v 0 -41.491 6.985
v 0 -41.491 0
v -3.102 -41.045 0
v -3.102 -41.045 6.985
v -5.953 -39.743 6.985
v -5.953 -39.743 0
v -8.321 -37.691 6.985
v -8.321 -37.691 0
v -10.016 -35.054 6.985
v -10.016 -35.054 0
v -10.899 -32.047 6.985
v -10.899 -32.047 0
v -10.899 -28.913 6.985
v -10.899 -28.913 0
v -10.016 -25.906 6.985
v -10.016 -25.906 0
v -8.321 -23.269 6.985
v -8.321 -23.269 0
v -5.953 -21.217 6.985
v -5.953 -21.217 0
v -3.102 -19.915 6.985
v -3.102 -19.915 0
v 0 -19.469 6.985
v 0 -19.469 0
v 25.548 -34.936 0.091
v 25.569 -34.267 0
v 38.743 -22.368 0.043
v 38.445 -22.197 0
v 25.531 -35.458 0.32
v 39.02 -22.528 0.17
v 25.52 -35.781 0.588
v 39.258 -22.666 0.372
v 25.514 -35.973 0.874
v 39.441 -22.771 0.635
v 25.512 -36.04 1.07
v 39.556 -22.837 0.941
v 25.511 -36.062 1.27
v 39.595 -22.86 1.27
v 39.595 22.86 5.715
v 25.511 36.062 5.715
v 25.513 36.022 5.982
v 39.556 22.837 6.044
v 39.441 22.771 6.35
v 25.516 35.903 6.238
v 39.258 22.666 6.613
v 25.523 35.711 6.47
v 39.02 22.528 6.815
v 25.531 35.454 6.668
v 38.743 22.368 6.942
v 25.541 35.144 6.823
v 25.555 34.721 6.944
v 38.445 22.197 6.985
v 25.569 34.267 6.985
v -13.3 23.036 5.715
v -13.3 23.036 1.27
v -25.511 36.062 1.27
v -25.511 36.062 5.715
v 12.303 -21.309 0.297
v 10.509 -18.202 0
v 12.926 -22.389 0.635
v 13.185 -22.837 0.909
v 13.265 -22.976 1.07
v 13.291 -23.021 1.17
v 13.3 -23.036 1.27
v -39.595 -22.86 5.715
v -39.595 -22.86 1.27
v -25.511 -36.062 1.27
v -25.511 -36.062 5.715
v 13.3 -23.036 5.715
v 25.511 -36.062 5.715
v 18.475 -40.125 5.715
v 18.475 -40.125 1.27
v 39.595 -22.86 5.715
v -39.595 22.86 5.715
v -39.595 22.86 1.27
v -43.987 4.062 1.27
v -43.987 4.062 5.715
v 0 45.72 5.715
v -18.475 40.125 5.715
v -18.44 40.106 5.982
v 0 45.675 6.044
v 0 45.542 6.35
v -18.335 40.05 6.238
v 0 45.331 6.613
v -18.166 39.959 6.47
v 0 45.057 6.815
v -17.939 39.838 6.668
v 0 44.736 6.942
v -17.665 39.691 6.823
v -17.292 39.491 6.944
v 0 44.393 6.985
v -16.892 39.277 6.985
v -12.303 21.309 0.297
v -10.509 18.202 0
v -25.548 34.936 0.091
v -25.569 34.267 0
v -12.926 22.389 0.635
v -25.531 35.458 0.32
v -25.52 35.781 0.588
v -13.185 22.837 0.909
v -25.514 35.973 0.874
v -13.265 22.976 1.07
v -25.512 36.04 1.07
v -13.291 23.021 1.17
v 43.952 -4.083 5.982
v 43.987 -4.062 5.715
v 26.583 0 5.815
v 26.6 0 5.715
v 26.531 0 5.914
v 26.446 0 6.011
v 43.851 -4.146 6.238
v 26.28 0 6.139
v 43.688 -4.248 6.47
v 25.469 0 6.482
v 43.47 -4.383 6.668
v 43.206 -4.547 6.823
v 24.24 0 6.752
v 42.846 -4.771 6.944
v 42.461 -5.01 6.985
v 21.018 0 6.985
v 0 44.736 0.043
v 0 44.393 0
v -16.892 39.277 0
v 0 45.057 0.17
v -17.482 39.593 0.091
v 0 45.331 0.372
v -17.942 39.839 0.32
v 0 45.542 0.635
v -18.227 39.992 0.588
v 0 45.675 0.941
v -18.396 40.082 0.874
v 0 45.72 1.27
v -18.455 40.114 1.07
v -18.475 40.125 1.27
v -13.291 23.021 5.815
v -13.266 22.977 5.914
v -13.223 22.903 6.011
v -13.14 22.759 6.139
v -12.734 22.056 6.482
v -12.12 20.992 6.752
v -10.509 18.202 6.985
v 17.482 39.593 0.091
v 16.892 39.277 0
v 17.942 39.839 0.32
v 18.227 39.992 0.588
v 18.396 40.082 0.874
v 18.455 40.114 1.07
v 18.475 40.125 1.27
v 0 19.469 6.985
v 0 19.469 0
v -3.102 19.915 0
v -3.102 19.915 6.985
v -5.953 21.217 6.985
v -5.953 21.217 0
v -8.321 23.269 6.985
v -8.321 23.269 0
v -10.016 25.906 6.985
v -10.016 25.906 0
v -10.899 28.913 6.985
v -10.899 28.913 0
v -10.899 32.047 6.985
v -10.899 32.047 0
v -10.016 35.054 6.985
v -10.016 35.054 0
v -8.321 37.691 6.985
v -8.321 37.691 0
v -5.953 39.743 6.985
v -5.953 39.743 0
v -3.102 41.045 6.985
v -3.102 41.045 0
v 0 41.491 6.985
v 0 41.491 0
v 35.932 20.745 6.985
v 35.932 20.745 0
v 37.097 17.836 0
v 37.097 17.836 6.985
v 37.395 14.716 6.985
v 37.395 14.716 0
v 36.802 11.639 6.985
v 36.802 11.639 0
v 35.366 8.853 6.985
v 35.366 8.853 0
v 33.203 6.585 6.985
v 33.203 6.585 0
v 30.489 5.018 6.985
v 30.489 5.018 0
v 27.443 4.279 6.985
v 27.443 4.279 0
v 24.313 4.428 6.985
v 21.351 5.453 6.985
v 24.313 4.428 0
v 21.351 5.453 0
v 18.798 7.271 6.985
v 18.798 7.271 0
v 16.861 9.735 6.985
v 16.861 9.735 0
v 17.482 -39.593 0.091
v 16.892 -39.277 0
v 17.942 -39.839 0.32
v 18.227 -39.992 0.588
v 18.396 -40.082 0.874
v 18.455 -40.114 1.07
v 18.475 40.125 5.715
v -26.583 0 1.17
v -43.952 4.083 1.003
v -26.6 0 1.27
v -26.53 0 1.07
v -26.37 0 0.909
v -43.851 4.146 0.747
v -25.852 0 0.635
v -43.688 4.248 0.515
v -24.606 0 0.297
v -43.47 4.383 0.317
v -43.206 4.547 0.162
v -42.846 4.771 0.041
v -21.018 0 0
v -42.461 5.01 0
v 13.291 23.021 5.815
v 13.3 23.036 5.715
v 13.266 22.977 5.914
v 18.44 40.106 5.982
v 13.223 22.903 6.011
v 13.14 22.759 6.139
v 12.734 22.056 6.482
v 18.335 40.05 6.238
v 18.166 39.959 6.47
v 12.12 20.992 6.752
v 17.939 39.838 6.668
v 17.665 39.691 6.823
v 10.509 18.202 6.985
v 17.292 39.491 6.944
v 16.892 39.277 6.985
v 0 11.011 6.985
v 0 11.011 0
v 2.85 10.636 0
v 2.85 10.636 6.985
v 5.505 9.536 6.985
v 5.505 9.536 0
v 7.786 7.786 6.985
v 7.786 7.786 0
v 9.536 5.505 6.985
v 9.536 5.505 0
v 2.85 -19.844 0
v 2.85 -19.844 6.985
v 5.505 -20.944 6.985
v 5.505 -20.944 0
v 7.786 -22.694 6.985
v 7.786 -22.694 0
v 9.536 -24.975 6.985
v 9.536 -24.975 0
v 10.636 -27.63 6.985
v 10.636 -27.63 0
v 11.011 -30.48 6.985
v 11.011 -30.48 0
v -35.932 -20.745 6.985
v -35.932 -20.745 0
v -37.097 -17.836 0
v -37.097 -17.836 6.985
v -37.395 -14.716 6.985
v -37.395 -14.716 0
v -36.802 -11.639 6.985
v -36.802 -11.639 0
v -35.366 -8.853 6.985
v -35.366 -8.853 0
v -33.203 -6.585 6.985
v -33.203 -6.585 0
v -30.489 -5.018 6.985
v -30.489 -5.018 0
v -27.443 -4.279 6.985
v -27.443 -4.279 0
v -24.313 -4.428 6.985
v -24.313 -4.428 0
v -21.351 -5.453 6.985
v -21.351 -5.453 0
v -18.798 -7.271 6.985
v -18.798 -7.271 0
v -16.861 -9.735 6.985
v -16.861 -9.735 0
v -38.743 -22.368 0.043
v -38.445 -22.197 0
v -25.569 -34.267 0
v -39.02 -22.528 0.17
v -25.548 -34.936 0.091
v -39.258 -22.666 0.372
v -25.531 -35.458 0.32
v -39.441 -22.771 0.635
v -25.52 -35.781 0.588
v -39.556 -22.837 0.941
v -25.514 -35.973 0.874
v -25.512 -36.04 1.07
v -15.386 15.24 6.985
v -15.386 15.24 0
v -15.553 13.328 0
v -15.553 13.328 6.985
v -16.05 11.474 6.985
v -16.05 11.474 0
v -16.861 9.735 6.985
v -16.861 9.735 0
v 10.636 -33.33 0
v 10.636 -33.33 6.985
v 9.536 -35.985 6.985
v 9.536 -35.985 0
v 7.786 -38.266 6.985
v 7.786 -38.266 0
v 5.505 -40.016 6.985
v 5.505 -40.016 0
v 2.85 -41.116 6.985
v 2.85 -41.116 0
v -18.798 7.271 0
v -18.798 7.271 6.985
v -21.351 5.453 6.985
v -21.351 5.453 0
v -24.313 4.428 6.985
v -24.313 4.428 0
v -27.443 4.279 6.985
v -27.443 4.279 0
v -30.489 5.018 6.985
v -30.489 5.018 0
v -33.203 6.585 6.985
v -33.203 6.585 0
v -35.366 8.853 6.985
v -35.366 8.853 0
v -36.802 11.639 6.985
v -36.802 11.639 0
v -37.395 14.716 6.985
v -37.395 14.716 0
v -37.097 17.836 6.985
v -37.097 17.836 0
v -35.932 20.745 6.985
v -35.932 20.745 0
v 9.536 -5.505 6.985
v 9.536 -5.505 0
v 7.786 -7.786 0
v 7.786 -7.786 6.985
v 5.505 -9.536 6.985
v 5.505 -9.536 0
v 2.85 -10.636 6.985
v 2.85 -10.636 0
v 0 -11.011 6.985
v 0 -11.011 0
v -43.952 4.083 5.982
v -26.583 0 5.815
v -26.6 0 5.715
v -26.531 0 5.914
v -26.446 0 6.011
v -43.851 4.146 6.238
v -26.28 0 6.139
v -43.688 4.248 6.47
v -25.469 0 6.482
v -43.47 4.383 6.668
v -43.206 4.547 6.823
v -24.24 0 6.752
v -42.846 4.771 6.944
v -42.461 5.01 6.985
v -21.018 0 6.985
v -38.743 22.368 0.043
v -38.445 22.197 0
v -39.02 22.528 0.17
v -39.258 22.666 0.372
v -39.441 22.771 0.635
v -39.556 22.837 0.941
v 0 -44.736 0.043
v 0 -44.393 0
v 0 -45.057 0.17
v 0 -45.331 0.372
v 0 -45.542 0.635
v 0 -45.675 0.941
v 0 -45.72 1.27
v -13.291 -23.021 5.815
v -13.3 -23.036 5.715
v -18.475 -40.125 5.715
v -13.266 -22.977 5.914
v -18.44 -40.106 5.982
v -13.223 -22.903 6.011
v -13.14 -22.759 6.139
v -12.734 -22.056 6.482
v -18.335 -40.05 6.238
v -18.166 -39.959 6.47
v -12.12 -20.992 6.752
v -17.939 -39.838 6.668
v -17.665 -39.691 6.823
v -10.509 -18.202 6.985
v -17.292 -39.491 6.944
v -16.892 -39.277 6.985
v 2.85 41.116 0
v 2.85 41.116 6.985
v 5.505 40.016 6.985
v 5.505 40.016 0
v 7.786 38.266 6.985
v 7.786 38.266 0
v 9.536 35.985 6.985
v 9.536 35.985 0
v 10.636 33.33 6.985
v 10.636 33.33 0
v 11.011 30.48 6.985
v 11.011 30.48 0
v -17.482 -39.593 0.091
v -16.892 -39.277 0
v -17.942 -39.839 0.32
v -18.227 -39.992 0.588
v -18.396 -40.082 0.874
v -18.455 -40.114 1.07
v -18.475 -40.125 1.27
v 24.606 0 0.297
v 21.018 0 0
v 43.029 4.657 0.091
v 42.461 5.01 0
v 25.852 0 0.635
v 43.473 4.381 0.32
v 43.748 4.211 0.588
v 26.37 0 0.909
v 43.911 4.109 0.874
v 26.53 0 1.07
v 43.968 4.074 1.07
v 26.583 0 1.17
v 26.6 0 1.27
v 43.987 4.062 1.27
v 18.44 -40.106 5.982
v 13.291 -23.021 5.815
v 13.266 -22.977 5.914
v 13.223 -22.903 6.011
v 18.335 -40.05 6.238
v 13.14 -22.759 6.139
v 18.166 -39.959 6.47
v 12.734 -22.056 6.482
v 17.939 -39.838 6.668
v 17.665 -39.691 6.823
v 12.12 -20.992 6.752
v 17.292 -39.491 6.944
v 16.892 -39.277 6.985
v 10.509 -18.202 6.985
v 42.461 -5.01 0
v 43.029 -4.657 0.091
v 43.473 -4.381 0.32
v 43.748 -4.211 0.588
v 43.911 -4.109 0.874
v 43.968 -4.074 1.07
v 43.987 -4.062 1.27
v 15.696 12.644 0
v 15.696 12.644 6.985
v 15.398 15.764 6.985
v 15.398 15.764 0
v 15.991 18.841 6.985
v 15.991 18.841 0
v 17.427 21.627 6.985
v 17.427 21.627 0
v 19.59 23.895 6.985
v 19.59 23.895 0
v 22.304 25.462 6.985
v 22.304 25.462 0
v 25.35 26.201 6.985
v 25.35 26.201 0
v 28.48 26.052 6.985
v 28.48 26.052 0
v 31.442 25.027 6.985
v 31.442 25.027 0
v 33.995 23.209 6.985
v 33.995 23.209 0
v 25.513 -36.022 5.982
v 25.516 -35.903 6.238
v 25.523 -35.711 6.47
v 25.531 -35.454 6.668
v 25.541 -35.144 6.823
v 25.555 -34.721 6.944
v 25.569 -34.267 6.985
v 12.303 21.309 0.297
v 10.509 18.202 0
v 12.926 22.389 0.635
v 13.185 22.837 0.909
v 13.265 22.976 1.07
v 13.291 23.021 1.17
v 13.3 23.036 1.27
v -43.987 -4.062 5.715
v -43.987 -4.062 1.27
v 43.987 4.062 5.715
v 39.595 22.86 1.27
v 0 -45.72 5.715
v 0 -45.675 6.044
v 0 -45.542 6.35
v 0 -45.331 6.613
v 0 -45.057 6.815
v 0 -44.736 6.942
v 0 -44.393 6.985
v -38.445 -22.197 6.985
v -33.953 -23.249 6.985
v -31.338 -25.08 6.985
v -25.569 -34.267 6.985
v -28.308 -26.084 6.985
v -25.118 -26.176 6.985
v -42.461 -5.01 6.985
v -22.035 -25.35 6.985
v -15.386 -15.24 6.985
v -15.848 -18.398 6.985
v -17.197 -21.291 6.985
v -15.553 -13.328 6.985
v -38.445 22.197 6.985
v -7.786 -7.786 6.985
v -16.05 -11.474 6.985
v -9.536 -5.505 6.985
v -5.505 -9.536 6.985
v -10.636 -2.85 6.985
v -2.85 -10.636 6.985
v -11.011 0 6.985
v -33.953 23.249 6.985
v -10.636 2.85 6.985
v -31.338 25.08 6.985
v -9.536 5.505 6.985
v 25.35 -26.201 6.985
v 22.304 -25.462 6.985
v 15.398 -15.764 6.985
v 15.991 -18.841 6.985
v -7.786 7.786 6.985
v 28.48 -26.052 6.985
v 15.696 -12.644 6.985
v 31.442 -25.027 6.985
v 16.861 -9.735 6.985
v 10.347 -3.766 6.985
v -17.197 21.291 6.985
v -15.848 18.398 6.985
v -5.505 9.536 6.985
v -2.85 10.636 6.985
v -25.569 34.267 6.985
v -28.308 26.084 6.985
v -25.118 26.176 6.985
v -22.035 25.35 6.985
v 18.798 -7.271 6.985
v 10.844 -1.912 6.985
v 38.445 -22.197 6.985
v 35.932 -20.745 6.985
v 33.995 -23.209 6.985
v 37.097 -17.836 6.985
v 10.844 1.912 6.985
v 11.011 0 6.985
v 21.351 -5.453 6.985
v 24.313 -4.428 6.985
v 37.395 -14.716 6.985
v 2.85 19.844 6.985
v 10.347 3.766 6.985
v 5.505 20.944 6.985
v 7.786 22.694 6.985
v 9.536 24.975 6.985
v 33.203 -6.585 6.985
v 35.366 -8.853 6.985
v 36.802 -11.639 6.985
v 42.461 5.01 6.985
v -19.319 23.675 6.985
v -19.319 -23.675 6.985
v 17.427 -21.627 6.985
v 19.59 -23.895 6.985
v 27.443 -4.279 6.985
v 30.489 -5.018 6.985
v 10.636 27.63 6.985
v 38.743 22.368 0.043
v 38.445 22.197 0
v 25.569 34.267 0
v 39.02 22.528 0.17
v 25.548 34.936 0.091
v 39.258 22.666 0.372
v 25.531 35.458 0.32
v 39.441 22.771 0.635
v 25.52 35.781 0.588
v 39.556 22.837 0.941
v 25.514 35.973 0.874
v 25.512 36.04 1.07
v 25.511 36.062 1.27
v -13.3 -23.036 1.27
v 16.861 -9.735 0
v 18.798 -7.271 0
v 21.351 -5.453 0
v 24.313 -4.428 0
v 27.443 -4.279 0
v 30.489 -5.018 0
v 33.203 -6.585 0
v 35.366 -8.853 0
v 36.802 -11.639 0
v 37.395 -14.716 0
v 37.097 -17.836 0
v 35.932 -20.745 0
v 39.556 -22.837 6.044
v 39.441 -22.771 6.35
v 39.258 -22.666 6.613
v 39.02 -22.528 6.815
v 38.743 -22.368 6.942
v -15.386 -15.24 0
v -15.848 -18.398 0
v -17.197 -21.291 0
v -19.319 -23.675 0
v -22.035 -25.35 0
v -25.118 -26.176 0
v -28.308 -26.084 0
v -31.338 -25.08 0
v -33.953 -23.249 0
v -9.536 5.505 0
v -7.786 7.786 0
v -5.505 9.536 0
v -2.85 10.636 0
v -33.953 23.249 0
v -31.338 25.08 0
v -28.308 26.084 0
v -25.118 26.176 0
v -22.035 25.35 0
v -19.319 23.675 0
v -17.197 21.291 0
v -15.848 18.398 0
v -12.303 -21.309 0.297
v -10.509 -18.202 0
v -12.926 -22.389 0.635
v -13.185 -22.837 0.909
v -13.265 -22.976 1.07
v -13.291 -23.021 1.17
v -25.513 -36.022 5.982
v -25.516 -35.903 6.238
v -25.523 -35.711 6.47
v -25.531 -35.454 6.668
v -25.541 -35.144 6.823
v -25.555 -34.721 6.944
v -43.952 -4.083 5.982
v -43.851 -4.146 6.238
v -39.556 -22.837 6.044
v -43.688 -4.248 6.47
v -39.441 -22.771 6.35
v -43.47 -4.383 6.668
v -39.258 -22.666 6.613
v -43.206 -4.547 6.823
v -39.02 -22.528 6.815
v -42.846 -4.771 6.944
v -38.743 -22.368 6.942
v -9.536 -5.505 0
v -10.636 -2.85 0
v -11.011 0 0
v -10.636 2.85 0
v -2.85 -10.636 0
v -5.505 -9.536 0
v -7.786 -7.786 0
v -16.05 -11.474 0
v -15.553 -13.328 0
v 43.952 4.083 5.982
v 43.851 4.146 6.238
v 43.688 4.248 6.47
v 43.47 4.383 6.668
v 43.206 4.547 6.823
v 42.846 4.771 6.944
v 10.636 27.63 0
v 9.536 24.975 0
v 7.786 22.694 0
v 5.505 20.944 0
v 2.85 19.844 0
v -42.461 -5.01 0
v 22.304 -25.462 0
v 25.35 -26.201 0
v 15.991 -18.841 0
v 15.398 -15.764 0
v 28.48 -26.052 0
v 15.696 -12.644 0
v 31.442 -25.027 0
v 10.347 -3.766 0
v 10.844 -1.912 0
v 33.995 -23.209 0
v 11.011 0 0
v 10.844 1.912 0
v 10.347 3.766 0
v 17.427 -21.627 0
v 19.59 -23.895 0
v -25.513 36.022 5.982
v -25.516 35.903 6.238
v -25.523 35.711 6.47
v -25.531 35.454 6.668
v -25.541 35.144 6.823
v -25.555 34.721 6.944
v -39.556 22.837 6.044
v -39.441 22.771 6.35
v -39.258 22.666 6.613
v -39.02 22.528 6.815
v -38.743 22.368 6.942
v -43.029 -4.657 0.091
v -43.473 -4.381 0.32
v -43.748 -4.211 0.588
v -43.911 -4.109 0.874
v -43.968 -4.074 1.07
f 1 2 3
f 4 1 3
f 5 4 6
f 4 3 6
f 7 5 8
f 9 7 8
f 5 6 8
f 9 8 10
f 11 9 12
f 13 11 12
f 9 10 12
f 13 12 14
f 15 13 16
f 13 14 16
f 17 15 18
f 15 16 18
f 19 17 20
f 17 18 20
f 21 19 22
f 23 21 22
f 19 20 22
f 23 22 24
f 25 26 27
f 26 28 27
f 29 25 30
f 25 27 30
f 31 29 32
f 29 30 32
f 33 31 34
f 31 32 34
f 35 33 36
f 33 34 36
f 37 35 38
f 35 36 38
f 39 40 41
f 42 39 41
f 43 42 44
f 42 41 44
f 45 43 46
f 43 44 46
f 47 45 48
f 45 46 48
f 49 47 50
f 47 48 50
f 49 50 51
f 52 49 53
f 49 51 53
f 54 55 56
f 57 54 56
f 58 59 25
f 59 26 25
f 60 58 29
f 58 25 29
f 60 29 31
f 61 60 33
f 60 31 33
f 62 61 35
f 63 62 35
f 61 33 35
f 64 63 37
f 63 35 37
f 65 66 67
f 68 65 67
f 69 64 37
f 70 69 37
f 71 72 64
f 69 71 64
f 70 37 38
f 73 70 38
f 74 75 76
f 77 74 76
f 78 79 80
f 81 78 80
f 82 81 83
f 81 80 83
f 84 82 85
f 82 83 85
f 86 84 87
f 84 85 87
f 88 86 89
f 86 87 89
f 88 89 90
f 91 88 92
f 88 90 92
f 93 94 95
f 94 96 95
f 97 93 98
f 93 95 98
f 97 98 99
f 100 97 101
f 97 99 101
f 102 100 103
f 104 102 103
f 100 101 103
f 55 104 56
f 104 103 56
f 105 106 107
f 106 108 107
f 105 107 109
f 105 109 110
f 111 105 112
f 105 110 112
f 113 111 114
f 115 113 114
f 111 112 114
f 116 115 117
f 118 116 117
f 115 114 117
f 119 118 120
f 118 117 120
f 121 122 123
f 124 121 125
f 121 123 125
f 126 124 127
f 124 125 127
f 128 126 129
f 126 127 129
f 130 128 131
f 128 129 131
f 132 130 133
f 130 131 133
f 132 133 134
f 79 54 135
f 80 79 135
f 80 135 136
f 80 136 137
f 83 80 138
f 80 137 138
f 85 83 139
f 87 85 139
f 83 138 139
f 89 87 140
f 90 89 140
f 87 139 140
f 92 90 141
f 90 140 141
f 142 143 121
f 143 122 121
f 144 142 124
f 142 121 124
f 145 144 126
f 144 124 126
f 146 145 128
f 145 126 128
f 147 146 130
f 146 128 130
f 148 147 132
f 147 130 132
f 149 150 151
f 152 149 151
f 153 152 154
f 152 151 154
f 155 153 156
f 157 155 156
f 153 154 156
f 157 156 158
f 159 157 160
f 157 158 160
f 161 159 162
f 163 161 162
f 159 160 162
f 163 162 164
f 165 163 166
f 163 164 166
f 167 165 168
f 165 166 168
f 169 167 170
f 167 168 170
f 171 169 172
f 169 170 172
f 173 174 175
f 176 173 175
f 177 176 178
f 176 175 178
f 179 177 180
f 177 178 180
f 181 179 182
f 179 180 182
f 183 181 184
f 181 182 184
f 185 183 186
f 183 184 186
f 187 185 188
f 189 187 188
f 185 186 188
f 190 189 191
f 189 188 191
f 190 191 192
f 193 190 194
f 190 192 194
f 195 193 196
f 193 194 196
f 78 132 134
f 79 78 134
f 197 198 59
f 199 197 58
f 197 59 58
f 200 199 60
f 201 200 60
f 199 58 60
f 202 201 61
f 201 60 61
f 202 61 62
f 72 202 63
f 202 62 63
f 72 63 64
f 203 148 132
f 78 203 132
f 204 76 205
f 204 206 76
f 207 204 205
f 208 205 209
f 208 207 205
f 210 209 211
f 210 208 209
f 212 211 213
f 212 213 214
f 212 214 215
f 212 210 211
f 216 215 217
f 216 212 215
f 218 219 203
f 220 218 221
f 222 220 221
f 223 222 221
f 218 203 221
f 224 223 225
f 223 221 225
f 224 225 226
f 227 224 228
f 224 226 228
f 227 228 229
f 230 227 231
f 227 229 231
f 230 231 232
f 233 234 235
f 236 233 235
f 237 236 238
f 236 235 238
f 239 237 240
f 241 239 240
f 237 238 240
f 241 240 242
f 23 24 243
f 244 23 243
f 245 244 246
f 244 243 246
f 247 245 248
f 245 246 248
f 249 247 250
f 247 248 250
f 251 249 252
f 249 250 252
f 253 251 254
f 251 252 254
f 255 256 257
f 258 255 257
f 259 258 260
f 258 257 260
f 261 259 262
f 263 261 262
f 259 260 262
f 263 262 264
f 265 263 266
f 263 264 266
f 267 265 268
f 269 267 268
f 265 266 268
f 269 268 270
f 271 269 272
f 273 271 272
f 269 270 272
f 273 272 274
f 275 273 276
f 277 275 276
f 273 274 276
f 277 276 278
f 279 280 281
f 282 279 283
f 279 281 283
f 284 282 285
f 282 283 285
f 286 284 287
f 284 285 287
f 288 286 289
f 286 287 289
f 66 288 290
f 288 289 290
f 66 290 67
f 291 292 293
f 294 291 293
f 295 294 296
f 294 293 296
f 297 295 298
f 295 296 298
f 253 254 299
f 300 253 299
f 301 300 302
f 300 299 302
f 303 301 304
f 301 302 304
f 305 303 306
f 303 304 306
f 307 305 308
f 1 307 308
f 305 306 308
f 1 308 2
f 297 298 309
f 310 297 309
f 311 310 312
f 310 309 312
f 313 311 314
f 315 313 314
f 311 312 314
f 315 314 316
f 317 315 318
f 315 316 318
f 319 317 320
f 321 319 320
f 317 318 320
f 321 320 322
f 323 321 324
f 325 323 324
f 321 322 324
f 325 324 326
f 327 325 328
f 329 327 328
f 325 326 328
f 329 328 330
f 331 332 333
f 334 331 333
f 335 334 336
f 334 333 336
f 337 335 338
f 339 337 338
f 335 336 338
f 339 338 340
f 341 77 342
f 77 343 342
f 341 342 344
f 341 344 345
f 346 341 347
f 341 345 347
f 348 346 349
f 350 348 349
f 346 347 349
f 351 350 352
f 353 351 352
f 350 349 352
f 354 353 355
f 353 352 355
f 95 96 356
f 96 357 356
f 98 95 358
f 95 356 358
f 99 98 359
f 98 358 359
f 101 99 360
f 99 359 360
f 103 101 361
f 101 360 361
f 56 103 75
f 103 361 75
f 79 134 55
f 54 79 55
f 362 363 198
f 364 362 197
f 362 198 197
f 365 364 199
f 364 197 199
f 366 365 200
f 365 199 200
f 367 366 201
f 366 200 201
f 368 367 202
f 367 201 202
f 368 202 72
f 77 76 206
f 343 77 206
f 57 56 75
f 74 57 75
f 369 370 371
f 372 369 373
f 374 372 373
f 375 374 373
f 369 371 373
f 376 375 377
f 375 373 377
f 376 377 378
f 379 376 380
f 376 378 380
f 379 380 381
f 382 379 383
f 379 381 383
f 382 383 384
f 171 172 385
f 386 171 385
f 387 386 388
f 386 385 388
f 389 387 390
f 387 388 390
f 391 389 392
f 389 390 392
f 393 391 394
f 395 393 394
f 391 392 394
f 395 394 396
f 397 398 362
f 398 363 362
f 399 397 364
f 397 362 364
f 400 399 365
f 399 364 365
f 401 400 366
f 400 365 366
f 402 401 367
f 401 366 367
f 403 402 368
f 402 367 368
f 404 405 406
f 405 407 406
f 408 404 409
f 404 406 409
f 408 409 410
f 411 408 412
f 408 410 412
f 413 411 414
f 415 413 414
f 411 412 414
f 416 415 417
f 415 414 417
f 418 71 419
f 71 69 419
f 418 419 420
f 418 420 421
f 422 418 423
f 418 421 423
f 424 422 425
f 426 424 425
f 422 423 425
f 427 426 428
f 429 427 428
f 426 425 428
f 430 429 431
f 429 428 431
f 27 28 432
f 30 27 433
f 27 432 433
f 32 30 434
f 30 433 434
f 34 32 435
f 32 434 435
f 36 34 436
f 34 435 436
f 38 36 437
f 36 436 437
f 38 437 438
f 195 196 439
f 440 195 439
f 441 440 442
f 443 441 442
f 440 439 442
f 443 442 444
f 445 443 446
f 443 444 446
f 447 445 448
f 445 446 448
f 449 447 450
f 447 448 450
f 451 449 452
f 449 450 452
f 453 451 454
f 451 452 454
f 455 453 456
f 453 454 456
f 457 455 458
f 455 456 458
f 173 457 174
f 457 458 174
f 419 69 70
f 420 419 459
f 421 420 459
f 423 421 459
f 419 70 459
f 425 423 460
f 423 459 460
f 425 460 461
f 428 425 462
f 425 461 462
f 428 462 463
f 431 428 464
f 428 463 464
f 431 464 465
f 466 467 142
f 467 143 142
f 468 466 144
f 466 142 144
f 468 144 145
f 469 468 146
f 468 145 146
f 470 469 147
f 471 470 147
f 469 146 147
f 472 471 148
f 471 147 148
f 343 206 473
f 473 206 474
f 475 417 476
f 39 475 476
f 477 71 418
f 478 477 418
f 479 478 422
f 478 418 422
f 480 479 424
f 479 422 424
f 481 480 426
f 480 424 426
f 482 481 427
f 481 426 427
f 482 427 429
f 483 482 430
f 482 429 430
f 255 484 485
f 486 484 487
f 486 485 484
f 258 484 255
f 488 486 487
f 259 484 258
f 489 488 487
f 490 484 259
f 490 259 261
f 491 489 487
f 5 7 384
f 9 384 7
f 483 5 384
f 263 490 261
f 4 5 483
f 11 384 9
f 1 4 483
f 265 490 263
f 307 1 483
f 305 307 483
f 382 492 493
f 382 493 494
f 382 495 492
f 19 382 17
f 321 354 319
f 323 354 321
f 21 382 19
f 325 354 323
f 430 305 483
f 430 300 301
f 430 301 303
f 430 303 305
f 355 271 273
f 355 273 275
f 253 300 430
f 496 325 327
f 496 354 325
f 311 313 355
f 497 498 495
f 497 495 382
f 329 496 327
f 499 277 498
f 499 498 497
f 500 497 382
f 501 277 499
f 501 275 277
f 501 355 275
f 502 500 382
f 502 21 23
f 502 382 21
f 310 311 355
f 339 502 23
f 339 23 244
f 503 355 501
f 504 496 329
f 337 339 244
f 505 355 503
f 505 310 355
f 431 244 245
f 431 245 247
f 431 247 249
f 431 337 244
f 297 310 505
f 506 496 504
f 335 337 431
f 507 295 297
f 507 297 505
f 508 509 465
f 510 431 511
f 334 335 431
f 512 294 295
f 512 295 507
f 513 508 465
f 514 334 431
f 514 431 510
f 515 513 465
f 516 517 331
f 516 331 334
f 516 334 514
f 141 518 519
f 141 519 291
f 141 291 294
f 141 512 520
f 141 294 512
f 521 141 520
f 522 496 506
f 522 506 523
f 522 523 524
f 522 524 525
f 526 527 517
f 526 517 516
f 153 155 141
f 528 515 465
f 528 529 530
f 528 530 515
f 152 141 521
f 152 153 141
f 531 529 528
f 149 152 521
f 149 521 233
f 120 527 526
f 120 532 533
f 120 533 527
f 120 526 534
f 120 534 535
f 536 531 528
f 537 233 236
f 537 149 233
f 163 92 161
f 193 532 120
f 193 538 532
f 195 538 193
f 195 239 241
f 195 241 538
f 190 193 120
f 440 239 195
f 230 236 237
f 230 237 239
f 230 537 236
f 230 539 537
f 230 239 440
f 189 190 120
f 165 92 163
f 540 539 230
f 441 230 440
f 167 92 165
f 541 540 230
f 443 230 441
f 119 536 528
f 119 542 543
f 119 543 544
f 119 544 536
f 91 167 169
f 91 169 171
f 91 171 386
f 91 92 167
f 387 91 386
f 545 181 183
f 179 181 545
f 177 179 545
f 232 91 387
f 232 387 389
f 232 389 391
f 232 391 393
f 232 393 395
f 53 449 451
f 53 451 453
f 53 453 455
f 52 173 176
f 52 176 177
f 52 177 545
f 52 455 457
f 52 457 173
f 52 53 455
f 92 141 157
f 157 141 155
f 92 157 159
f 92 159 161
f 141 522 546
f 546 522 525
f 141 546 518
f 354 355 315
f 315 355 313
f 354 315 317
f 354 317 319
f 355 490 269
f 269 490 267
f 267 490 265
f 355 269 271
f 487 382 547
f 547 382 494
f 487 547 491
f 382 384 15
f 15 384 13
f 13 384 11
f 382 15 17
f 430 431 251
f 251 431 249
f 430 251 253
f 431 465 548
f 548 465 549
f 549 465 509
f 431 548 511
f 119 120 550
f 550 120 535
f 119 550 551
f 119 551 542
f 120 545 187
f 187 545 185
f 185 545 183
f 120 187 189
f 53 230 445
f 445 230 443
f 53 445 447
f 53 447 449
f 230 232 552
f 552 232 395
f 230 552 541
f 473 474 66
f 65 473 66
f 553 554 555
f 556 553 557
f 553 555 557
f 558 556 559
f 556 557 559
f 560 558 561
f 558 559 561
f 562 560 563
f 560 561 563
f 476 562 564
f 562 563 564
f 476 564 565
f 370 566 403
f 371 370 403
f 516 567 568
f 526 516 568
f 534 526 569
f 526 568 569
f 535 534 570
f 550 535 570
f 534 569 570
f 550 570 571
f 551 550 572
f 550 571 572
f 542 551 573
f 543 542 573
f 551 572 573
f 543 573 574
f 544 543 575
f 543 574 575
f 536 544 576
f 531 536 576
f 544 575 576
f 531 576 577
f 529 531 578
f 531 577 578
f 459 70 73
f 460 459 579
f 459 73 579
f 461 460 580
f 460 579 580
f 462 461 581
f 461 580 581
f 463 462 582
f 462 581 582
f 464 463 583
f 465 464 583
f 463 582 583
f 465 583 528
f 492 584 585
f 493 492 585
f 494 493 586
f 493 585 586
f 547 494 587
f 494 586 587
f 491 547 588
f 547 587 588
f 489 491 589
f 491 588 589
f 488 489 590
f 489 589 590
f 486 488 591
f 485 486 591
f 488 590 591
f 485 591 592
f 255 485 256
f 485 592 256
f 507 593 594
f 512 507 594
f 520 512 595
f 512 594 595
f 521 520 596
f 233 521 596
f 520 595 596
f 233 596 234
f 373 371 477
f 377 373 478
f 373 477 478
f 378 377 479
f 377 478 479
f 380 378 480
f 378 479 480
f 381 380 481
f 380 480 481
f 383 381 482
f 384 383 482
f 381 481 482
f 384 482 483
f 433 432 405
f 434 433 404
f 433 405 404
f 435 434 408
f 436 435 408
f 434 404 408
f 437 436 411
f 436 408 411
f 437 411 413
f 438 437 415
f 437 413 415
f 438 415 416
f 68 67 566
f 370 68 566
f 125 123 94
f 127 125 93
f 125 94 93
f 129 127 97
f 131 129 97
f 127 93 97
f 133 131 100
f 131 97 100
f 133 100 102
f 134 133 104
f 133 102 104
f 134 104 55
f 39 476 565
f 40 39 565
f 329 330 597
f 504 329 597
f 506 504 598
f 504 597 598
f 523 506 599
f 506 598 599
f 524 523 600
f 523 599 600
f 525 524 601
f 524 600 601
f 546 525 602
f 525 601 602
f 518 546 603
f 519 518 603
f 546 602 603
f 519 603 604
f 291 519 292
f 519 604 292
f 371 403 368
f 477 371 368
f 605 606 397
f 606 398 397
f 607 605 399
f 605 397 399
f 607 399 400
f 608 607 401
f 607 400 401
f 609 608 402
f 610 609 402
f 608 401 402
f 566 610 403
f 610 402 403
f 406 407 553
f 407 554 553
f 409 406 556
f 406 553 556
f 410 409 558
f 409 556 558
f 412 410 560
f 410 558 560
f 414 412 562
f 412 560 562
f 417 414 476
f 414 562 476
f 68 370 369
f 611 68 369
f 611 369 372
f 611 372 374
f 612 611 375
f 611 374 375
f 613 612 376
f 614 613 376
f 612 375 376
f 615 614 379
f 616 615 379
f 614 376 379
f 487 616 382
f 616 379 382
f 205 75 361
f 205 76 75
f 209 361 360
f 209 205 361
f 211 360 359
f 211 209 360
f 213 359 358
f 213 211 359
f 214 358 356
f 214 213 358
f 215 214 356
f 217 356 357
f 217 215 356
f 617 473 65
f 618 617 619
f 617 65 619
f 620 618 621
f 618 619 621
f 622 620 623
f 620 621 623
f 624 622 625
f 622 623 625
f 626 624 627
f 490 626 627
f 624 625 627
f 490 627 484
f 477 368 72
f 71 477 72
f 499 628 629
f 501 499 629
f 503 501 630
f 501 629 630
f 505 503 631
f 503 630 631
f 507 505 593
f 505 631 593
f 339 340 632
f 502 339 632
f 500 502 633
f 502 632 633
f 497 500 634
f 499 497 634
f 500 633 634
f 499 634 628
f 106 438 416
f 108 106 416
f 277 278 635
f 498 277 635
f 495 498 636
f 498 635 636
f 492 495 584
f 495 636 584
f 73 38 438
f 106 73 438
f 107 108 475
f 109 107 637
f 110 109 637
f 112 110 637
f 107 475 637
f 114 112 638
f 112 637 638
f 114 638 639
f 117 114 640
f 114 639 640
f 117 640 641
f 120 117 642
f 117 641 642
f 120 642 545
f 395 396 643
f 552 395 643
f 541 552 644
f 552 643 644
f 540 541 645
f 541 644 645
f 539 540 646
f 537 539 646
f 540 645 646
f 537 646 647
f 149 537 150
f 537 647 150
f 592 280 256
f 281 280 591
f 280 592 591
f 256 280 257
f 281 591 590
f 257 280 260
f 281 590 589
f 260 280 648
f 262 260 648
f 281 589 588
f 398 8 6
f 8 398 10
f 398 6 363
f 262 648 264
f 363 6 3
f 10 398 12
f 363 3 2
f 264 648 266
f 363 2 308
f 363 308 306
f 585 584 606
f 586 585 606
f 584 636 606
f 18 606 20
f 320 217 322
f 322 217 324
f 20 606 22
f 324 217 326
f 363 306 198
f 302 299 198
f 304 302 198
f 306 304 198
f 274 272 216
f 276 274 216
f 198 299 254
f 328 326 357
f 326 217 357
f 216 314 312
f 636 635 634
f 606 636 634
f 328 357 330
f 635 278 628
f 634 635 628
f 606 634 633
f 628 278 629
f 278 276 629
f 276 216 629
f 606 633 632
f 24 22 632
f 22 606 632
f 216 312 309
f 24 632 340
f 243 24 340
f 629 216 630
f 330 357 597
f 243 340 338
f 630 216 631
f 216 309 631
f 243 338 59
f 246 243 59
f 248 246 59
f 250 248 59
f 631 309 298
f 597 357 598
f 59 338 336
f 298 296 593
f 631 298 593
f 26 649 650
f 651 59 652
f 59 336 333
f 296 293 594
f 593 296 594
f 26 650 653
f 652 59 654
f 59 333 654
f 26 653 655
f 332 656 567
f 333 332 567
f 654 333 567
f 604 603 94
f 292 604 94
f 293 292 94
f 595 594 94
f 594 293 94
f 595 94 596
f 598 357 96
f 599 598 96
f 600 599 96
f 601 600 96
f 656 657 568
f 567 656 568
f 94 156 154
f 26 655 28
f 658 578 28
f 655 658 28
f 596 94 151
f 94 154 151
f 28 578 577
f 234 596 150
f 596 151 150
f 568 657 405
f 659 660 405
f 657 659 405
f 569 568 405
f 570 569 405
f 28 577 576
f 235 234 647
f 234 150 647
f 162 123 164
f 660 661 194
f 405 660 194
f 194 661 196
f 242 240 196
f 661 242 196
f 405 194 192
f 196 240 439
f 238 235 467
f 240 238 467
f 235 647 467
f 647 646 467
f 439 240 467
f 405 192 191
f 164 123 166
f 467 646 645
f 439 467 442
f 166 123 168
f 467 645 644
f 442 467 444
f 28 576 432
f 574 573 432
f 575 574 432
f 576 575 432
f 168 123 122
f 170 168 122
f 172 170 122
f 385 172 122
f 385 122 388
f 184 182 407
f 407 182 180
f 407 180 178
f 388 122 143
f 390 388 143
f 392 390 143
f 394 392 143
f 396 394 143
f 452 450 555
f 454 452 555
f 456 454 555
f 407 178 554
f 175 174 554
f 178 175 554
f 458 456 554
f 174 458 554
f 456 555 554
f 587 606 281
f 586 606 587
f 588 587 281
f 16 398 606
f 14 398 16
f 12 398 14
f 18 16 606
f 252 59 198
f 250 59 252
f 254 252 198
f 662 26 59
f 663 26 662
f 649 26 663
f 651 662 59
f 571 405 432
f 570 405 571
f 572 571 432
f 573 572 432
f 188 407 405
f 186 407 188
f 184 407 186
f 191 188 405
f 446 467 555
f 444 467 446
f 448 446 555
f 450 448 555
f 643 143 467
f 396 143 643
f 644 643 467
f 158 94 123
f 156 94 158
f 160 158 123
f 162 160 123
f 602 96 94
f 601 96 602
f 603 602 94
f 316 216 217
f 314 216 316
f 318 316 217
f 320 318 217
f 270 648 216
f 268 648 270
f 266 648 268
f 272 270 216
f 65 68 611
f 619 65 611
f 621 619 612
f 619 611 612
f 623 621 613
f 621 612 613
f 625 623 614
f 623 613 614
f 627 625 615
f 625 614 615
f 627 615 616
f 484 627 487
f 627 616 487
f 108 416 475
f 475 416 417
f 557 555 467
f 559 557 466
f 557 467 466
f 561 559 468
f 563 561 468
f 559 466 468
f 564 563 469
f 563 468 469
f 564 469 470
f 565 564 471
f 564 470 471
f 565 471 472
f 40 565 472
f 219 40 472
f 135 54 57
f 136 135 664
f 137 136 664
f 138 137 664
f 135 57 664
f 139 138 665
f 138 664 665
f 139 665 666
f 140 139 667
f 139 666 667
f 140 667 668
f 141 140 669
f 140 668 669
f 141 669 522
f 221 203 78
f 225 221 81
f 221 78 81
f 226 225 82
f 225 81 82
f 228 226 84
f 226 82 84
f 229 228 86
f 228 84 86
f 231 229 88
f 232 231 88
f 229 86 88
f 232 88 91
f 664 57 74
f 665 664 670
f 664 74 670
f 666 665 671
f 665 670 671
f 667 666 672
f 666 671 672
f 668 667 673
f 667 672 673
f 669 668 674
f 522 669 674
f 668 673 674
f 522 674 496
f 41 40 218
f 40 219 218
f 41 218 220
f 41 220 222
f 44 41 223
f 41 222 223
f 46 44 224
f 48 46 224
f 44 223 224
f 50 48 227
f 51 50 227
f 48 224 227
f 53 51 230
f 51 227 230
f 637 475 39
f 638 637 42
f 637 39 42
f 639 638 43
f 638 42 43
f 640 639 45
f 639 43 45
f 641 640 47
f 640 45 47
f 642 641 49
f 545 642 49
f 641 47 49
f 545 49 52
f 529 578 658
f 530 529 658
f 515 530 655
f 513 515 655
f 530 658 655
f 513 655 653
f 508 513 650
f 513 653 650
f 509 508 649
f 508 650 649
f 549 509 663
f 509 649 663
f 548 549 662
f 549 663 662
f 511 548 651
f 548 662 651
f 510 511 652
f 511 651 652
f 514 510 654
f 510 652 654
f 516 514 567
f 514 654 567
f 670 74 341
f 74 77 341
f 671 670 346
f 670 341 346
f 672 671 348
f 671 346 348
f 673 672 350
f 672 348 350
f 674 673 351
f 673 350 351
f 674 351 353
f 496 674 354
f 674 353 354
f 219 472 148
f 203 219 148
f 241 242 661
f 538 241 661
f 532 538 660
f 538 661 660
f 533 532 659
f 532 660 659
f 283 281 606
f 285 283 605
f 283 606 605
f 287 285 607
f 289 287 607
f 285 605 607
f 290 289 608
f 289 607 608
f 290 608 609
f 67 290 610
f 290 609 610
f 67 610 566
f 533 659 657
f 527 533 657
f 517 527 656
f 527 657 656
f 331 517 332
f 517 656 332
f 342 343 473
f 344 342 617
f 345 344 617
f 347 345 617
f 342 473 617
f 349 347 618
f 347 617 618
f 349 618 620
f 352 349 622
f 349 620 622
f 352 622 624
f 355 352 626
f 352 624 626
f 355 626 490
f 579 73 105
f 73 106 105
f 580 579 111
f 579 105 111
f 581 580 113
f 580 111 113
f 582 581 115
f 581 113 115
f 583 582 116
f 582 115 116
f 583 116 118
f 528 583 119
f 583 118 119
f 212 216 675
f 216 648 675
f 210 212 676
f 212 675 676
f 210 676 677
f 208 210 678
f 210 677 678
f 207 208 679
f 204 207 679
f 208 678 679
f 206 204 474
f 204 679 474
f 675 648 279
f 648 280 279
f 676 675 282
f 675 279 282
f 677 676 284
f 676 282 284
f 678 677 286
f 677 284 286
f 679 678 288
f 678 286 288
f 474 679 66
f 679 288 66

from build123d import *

# Parameters (mm, degrees)
F1_DEPTH = 6.985
F2_R     = 1.27
F3_R     = 1.27


with BuildPart() as f1:
    # F0 (on Top) → F1 (new body)
    with BuildSketch(Plane.XY):
        with BuildLine():
            Line((16.8607351888, 9.73455), (12.3232464425, 7.1148296509))
            ThreePointArc((12.3232464425, 7.1148296509), (13.2836873211, 5.1016521834), (13.9177271481, 2.9631191126))
            Line((13.9177271481, 2.9631191126), (26.6000035513, 0))
            Line((26.6000035513, 0), (43.9866338233, 4.0622562405))
            Line((43.9866338233, 4.0622562405), (39.594681461, 22.86))
            Line((39.594681461, 22.86), (35.9321734259, 20.74545))
            ThreePointArc((35.9321734259, 20.74545), (37.032166988, 18.0898306237), (37.4073543073, 15.24))
            ThreePointArc((37.4073543073, 15.24), (29.2462849311, 4.6042873193), (16.8607351888, 9.73455))
        make_face()
        with BuildLine():
            ThreePointArc((9.525, 10.5715457169), (11.0600040526, 8.9531845843), (12.3232464425, 7.1148296509))
            Line((12.3232464425, 7.1148296509), (16.8607351888, 9.73455))
            ThreePointArc((16.8607351888, 9.73455), (20.8910043073, 24.7757191185), (35.9321734259, 20.74545))
            Line((35.9321734259, 20.74545), (39.594681461, 22.86))
            Line((39.594681461, 22.86), (25.5113340126, 36.0624141977))
            Line((25.5113340126, 36.0624141977), (13.3000017757, 23.0362788162))
            Line((13.3000017757, 23.0362788162), (9.525, 10.5715457169))
        make_face()
        with BuildLine():
            Line((16.8607351888, -9.73455), (12.3232464425, -7.1148296509))
            ThreePointArc((12.3232464425, -7.1148296509), (11.0600040526, -8.9531845843), (9.525, -10.5715457169))
            Line((9.525, -10.5715457169), (13.3000017757, -23.0362788162))
            Line((13.3000017757, -23.0362788162), (25.5113340126, -36.0624141977))
            Line((25.5113340126, -36.0624141977), (39.594681461, -22.86))
            Line((39.594681461, -22.86), (35.9321734259, -20.74545))
            ThreePointArc((35.9321734259, -20.74545), (20.8910043073, -24.7757191185), (16.8607351888, -9.73455))
        make_face()
        with BuildLine():
            ThreePointArc((13.9177271481, -2.9631191126), (13.2836873211, -5.1016521834), (12.3232464425, -7.1148296509))
            Line((12.3232464425, -7.1148296509), (16.8607351888, -9.73455))
            ThreePointArc((16.8607351888, -9.73455), (29.2462849311, -4.6042873193), (37.4073543073, -15.24))
            ThreePointArc((37.4073543073, -15.24), (37.032166988, -18.0898306237), (35.9321734259, -20.74545))
            Line((35.9321734259, -20.74545), (39.594681461, -22.86))
            Line((39.594681461, -22.86), (43.9866338233, -4.0622562405))
            Line((43.9866338233, -4.0622562405), (26.6000035513, 0))
            Line((26.6000035513, 0), (13.9177271481, -2.9631191126))
        make_face()
        with BuildLine():
            ThreePointArc((-4.3927271481, 13.5346648295), (-2.2236832685, 14.0548367676), (0, 14.2296593017))
            Line((0, 14.2296593017), (0, 19.4691))
            ThreePointArc((0, 19.4691), (-11.0109, 30.48), (0, 41.4909))
            Line((0, 41.4909), (0, 45.72))
            Line((0, 45.72), (-18.4752998107, 40.1246704382))
            Line((-18.4752998107, 40.1246704382), (-13.3000017757, 23.0362788162))
            Line((-13.3000017757, 23.0362788162), (-4.3927271481, 13.5346648295))
        make_face()
        with BuildLine():
            Line((0, 19.4691), (0, 14.2296593017))
            ThreePointArc((0, 14.2296593017), (2.2236832685, 14.0548367676), (4.3927271481, 13.5346648295))
            Line((4.3927271481, 13.5346648295), (13.3000017757, 23.0362788162))
            Line((13.3000017757, 23.0362788162), (18.4752998107, 40.1246704382))
            Line((18.4752998107, 40.1246704382), (0, 45.72))
            Line((0, 45.72), (0, 41.4909))
            ThreePointArc((0, 41.4909), (7.785882057, 38.265882057), (11.0109, 30.48))
            ThreePointArc((11.0109, 30.48), (7.785882057, 22.694117943), (0, 19.4691))
        make_face()
        with BuildLine():
            Line((26.6000035513, 0), (13.9177271481, 2.9631191126))
            ThreePointArc((13.9177271481, 2.9631191126), (14.1514613983, 1.4897463328), (14.2296593017, 0))
            ThreePointArc((14.2296593017, 0), (14.1514613983, -1.4897463328), (13.9177271481, -2.9631191126))
            Line((13.9177271481, -2.9631191126), (26.6000035513, 0))
        make_face()
        with BuildLine():
            ThreePointArc((4.3927271481, 13.5346648295), (7.1148296509, 12.3232464425), (9.525, 10.5715457169))
            Line((9.525, 10.5715457169), (13.3000017757, 23.0362788162))
            Line((13.3000017757, 23.0362788162), (4.3927271481, 13.5346648295))
        make_face()
        with BuildLine():
            Line((0, -19.4691), (0, -14.2296593017))
            ThreePointArc((0, -14.2296593017), (-2.2236832685, -14.0548367676), (-4.3927271481, -13.5346648295))
            Line((-4.3927271481, -13.5346648295), (-13.3000017757, -23.0362788162))
            Line((-13.3000017757, -23.0362788162), (-18.4752998107, -40.1246704382))
            Line((-18.4752998107, -40.1246704382), (0, -45.72))
            Line((0, -45.72), (0, -41.4909))
            ThreePointArc((0, -41.4909), (-11.0109, -30.48), (0, -19.4691))
        make_face()
        with BuildLine():
            ThreePointArc((4.3927271481, -13.5346648295), (2.2236832685, -14.0548367676), (0, -14.2296593017))
            Line((0, -14.2296593017), (0, -19.4691))
            ThreePointArc((0, -19.4691), (7.785882057, -22.694117943), (11.0109, -30.48))
            ThreePointArc((11.0109, -30.48), (7.785882057, -38.265882057), (0, -41.4909))
            Line((0, -41.4909), (0, -45.72))
            Line((0, -45.72), (18.4752998107, -40.1246704382))
            Line((18.4752998107, -40.1246704382), (13.3000017757, -23.0362788162))
            Line((13.3000017757, -23.0362788162), (4.3927271481, -13.5346648295))
        make_face()
        with BuildLine():
            Line((13.3000017757, -23.0362788162), (9.525, -10.5715457169))
            ThreePointArc((9.525, -10.5715457169), (7.1148296509, -12.3232464425), (4.3927271481, -13.5346648295))
            Line((4.3927271481, -13.5346648295), (13.3000017757, -23.0362788162))
        make_face()
        with BuildLine():
            Line((-16.8607351888, 9.73455), (-12.3232464425, 7.1148296509))
            ThreePointArc((-12.3232464425, 7.1148296509), (-11.0600040526, 8.9531845843), (-9.525, 10.5715457169))
            Line((-9.525, 10.5715457169), (-13.3000017757, 23.0362788162))
            Line((-13.3000017757, 23.0362788162), (-25.5113340126, 36.0624141977))
            Line((-25.5113340126, 36.0624141977), (-39.594681461, 22.86))
            Line((-39.594681461, 22.86), (-35.9321734259, 20.74545))
            ThreePointArc((-35.9321734259, 20.74545), (-23.5466236836, 25.8757126807), (-15.3855543073, 15.24))
            ThreePointArc((-15.3855543073, 15.24), (-15.7607416267, 12.3901693763), (-16.8607351888, 9.73455))
        make_face()
        with BuildLine():
            ThreePointArc((-13.9177271481, 2.9631191126), (-13.2836873211, 5.1016521834), (-12.3232464425, 7.1148296509))
            Line((-12.3232464425, 7.1148296509), (-16.8607351888, 9.73455))
            ThreePointArc((-16.8607351888, 9.73455), (-31.9019043073, 5.7042808815), (-35.9321734259, 20.74545))
            Line((-35.9321734259, 20.74545), (-39.594681461, 22.86))
            Line((-39.594681461, 22.86), (-43.9866338233, 4.0622562405))
            Line((-43.9866338233, 4.0622562405), (-26.6000035513, 0))
            Line((-26.6000035513, 0), (-13.9177271481, 2.9631191126))
        make_face()
        with BuildLine():
            ThreePointArc((-9.525, 10.5715457169), (-7.1148296509, 12.3232464425), (-4.3927271481, 13.5346648295))
            Line((-4.3927271481, 13.5346648295), (-13.3000017757, 23.0362788162))
            Line((-13.3000017757, 23.0362788162), (-9.525, 10.5715457169))
        make_face()
        with BuildLine():
            Line((-16.8607351888, -9.73455), (-12.3232464425, -7.1148296509))
            ThreePointArc((-12.3232464425, -7.1148296509), (-13.2836873211, -5.1016521834), (-13.9177271481, -2.9631191126))
            Line((-13.9177271481, -2.9631191126), (-26.6000035513, 0))
            Line((-26.6000035513, 0), (-43.9866338233, -4.0622562405))
            Line((-43.9866338233, -4.0622562405), (-39.594681461, -22.86))
            Line((-39.594681461, -22.86), (-35.9321734259, -20.74545))
            ThreePointArc((-35.9321734259, -20.74545), (-31.9019043073, -5.7042808815), (-16.8607351888, -9.73455))
        make_face()
        with BuildLine():
            ThreePointArc((-9.525, -10.5715457169), (-11.0600040526, -8.9531845843), (-12.3232464425, -7.1148296509))
            Line((-12.3232464425, -7.1148296509), (-16.8607351888, -9.73455))
            ThreePointArc((-16.8607351888, -9.73455), (-15.7607416267, -12.3901693763), (-15.3855543073, -15.24))
            ThreePointArc((-15.3855543073, -15.24), (-23.5466236836, -25.8757126807), (-35.9321734259, -20.74545))
            Line((-35.9321734259, -20.74545), (-39.594681461, -22.86))
            Line((-39.594681461, -22.86), (-25.5113340126, -36.0624141977))
            Line((-25.5113340126, -36.0624141977), (-13.3000017757, -23.0362788162))
            Line((-13.3000017757, -23.0362788162), (-9.525, -10.5715457169))
        make_face()
        with BuildLine():
            Line((-13.3000017757, -23.0362788162), (-4.3927271481, -13.5346648295))
            ThreePointArc((-4.3927271481, -13.5346648295), (-7.1148296509, -12.3232464425), (-9.525, -10.5715457169))
            Line((-9.525, -10.5715457169), (-13.3000017757, -23.0362788162))
        make_face()
        with BuildLine():
            ThreePointArc((-13.9177271481, -2.9631191126), (-14.2296593017, 0), (-13.9177271481, 2.9631191126))
            Line((-13.9177271481, 2.9631191126), (-26.6000035513, 0))
            Line((-26.6000035513, 0), (-13.9177271481, -2.9631191126))
        make_face()
        with BuildLine():
            ThreePointArc((-9.5357191185, -5.50545), (-11.0109, 0), (-9.5357191185, 5.50545))
            Line((-9.5357191185, 5.50545), (-12.3232464425, 7.1148296509))
            ThreePointArc((-12.3232464425, 7.1148296509), (-13.2836873211, 5.1016521834), (-13.9177271481, 2.9631191126))
            ThreePointArc((-13.9177271481, 2.9631191126), (-14.2296593017, 0), (-13.9177271481, -2.9631191126))
            ThreePointArc((-13.9177271481, -2.9631191126), (-13.2836873211, -5.1016521834), (-12.3232464425, -7.1148296509))
            Line((-12.3232464425, -7.1148296509), (-9.5357191185, -5.50545))
        make_face()
        with BuildLine():
            ThreePointArc((-9.5357191185, 5.50545), (-5.50545, 9.5357191185), (0, 11.0109))
            Line((0, 11.0109), (0, 14.2296593017))
            ThreePointArc((0, 14.2296593017), (-2.2236832685, 14.0548367676), (-4.3927271481, 13.5346648295))
            ThreePointArc((-4.3927271481, 13.5346648295), (-7.1148296509, 12.3232464425), (-9.525, 10.5715457169))
            ThreePointArc((-9.525, 10.5715457169), (-11.0600040526, 8.9531845843), (-12.3232464425, 7.1148296509))
            Line((-12.3232464425, 7.1148296509), (-9.5357191185, 5.50545))
        make_face()
        with BuildLine():
            ThreePointArc((0, 11.0109), (5.50545, 9.5357191185), (9.5357191185, 5.50545))
            Line((9.5357191185, 5.50545), (12.3232464425, 7.1148296509))
            ThreePointArc((12.3232464425, 7.1148296509), (11.0600040526, 8.9531845843), (9.525, 10.5715457169))
            ThreePointArc((9.525, 10.5715457169), (7.1148296509, 12.3232464425), (4.3927271481, 13.5346648295))
            ThreePointArc((4.3927271481, 13.5346648295), (2.2236832685, 14.0548367676), (0, 14.2296593017))
            Line((0, 14.2296593017), (0, 11.0109))
        make_face()
        with BuildLine():
            ThreePointArc((9.5357191185, 5.50545), (10.6357126807, 2.8498306237), (11.0109, 0))
            ThreePointArc((11.0109, 0), (10.6357126807, -2.8498306237), (9.5357191185, -5.50545))
            Line((9.5357191185, -5.50545), (12.3232464425, -7.1148296509))
            ThreePointArc((12.3232464425, -7.1148296509), (13.2836873211, -5.1016521834), (13.9177271481, -2.9631191126))
            ThreePointArc((13.9177271481, -2.9631191126), (14.1514613983, -1.4897463328), (14.2296593017, 0))
            ThreePointArc((14.2296593017, 0), (14.1514613983, 1.4897463328), (13.9177271481, 2.9631191126))
            ThreePointArc((13.9177271481, 2.9631191126), (13.2836873211, 5.1016521834), (12.3232464425, 7.1148296509))
            Line((12.3232464425, 7.1148296509), (9.5357191185, 5.50545))
        make_face()
        with BuildLine():
            Line((12.3232464425, -7.1148296509), (9.5357191185, -5.50545))
            ThreePointArc((9.5357191185, -5.50545), (5.50545, -9.5357191185), (0, -11.0109))
            Line((0, -11.0109), (0, -14.2296593017))
            ThreePointArc((0, -14.2296593017), (2.2236832685, -14.0548367676), (4.3927271481, -13.5346648295))
            ThreePointArc((4.3927271481, -13.5346648295), (7.1148296509, -12.3232464425), (9.525, -10.5715457169))
            ThreePointArc((9.525, -10.5715457169), (11.0600040526, -8.9531845843), (12.3232464425, -7.1148296509))
        make_face()
        with BuildLine():
            Line((0, -14.2296593017), (0, -11.0109))
            ThreePointArc((0, -11.0109), (-5.50545, -9.5357191185), (-9.5357191185, -5.50545))
            Line((-9.5357191185, -5.50545), (-12.3232464425, -7.1148296509))
            ThreePointArc((-12.3232464425, -7.1148296509), (-11.0600040526, -8.9531845843), (-9.525, -10.5715457169))
            ThreePointArc((-9.525, -10.5715457169), (-7.1148296509, -12.3232464425), (-4.3927271481, -13.5346648295))
            ThreePointArc((-4.3927271481, -13.5346648295), (-2.2236832685, -14.0548367676), (0, -14.2296593017))
        make_face()
    extrude(amount=F1_DEPTH)

    # F2
    f2_edges = [f1.edges().sort_by_distance(p)[0] for p in [
        (9.23765, 42.922335, 6.985),
        (15.887651, 31.580475, 6.985),
        (19.405668, 29.549347, 6.985),
        (32.553008, 29.461207, 6.985),
        (41.790658, 13.461128, 6.985),
        (35.293319, 2.031128, 6.985),
        (35.293319, -2.031128, 6.985),
        (19.405668, -29.549347, 6.985),
        (15.887651, -31.580475, 6.985),
        (-15.887651, -31.580475, 6.985),
        (-19.405668, -29.549347, 6.985),
        (-35.293319, -2.031128, 6.985),
        (-35.293319, 2.031128, 6.985),
        (-19.405668, 29.549347, 6.985),
        (-15.887651, 31.580475, 6.985),
        (-9.23765, 42.922335, 6.985),
        (-32.553008, 29.461207, 6.985),
        (-41.790658, 13.461128, 6.985),
        (-41.790658, -13.461128, 6.985),
        (-32.553008, -29.461207, 6.985),
        (-9.23765, -42.922335, 6.985),
        (9.23765, -42.922335, 6.985),
        (32.553008, -29.461207, 6.985),
        (41.790658, -13.461128, 6.985),
    ]]
    fillet(f2_edges, radius=F2_R)

    # F3
    f3_edges = [f1.edges().sort_by_distance(p)[0] for p in [
        (-32.553008, -29.461207, 0),
        (-41.790658, -13.461128, 0),
        (-35.293319, -2.031128, 0),
        (-35.293319, 2.031128, 0),
        (-41.790658, 13.461128, 0),
        (-32.553008, 29.461207, 0),
        (-19.405668, 29.549347, 0),
        (-15.887651, 31.580475, 0),
        (15.887651, 31.580475, 0),
        (9.23765, 42.922335, 0),
        (-9.23765, 42.922335, 0),
        (19.405668, 29.549347, 0),
        (32.553008, 29.461207, 0),
        (41.790658, 13.461128, 0),
        (35.293319, -2.031128, 0),
        (35.293319, 2.031128, 0),
        (41.790658, -13.461128, 0),
        (32.553008, -29.461207, 0),
        (9.23765, -42.922335, 0),
        (-9.23765, -42.922335, 0),
        (-15.887651, -31.580475, 0),
        (-19.405668, -29.549347, 0),
        (15.887651, -31.580475, 0),
        (19.405668, -29.549347, 0),
    ]]
    fillet(f3_edges, radius=F3_R)


solid = f1.part
